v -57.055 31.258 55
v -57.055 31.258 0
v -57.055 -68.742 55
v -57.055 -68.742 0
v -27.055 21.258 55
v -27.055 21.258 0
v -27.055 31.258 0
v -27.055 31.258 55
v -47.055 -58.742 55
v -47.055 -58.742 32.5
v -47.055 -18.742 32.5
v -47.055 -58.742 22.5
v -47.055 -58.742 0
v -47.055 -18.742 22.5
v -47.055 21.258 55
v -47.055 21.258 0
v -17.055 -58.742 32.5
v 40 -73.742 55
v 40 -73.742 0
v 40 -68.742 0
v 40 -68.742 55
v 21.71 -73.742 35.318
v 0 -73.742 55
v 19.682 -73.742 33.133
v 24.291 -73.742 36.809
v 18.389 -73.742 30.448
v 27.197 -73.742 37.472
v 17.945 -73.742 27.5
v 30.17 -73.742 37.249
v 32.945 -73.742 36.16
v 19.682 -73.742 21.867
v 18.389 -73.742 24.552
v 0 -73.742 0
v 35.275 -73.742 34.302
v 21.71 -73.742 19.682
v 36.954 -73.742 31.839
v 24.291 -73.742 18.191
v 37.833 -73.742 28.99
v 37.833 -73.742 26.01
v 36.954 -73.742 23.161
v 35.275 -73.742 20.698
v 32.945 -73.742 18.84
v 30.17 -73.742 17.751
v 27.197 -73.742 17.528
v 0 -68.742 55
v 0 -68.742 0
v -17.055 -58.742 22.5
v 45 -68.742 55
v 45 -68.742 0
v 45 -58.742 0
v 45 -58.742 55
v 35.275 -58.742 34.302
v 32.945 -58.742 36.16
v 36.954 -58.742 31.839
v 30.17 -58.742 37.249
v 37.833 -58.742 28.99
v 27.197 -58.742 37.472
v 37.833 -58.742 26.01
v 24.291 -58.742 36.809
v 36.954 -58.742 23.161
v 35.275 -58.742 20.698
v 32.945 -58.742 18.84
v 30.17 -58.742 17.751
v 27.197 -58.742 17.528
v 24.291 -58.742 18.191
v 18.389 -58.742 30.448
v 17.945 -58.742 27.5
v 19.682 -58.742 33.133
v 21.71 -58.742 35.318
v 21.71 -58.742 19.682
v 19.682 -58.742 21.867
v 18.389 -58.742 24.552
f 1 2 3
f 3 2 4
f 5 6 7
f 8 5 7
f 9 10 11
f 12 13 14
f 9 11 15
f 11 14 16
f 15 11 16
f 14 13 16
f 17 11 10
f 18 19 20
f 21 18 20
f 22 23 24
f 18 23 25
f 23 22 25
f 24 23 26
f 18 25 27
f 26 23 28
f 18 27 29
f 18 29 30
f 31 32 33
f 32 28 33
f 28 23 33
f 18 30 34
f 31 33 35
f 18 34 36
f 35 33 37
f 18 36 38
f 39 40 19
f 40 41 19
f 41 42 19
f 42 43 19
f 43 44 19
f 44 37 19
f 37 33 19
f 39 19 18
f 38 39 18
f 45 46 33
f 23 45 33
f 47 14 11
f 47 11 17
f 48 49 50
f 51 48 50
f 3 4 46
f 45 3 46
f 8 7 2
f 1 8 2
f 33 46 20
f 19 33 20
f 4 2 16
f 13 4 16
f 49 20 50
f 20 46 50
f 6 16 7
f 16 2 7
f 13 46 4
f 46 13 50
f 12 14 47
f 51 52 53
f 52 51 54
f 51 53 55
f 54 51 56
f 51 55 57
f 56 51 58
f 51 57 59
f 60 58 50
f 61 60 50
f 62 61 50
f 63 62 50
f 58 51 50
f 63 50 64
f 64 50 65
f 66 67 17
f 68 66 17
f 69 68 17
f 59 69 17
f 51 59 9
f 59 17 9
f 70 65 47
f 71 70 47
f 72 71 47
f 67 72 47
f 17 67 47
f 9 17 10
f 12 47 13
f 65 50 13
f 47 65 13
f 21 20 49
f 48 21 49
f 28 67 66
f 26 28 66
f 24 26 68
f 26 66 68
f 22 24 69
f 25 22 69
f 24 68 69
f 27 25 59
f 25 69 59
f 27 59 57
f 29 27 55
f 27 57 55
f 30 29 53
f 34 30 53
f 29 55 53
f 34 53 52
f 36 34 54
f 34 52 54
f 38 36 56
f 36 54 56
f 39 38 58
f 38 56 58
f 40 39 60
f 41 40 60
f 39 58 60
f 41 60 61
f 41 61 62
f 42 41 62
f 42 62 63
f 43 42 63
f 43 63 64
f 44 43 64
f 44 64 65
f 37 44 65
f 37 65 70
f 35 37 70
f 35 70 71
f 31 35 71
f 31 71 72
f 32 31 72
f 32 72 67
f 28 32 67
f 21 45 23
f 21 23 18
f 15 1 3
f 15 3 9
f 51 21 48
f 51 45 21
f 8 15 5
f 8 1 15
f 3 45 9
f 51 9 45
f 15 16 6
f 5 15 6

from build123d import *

# Parameters (mm, degrees)
BOSS_EXTRUDE1_DEPTH = 55
RIB1_REACH          = 99.208
SKETCH2_WALL_W      = 246.416860904
SKETCH2_WALL_H      = 10
SKETCH3_R           = 10
CUT_EXTRUDE1_DEPTH  = 120.917878263


with BuildPart() as part:
    # Sketch1 → Boss-Extrude1 (new body)
    with BuildSketch(Plane.XY):
        Polygon((-27.055214724, 21.257668712), (-27.055214724, 31.257668712), (-57.055214724, 31.257668712), (-57.055214724, -68.742331288), (0, -68.742331288), (0, -73.742331288), (40, -73.742331288), (40, -68.742331288), (45, -68.742331288), (45, -58.742331288), (-47.055214724, -58.742331288), (-47.055214724, 21.257668712), align=None)
    extrude(amount=BOSS_EXTRUDE1_DEPTH)

    # Sketch2 wall → Rib1 (add, up to next)
    with BuildSketch(Plane(origin=(-32.055214724, -38.742331288, 27.5), x_dir=(0.6, -0.8, 0), z_dir=(0.8, 0.6, 0)), mode=Mode.PRIVATE) as rib1_sk1:
        Rectangle(SKETCH2_WALL_W, SKETCH2_WALL_H)
    rib1_tool1 = extrude(rib1_sk1.sketch, amount=-RIB1_REACH, mode=Mode.PRIVATE) - part.part
    add(rib1_tool1.solids().sort_by_distance((-32.055214724, -38.742331288, 27.5))[0])

    # Sketch3 → Cut-Extrude1 (cut, through all)
    with BuildSketch(Plane(origin=(0, -58.742331288, 0), x_dir=(1, 0, 0), z_dir=(0, 1, 0))):
        with Locations(Location((27.944785276, -27.5, 0), (0, 0, 180))):
            Circle(SKETCH3_R)
    extrude(amount=-CUT_EXTRUDE1_DEPTH, mode=Mode.SUBTRACT)


solid = part.part
